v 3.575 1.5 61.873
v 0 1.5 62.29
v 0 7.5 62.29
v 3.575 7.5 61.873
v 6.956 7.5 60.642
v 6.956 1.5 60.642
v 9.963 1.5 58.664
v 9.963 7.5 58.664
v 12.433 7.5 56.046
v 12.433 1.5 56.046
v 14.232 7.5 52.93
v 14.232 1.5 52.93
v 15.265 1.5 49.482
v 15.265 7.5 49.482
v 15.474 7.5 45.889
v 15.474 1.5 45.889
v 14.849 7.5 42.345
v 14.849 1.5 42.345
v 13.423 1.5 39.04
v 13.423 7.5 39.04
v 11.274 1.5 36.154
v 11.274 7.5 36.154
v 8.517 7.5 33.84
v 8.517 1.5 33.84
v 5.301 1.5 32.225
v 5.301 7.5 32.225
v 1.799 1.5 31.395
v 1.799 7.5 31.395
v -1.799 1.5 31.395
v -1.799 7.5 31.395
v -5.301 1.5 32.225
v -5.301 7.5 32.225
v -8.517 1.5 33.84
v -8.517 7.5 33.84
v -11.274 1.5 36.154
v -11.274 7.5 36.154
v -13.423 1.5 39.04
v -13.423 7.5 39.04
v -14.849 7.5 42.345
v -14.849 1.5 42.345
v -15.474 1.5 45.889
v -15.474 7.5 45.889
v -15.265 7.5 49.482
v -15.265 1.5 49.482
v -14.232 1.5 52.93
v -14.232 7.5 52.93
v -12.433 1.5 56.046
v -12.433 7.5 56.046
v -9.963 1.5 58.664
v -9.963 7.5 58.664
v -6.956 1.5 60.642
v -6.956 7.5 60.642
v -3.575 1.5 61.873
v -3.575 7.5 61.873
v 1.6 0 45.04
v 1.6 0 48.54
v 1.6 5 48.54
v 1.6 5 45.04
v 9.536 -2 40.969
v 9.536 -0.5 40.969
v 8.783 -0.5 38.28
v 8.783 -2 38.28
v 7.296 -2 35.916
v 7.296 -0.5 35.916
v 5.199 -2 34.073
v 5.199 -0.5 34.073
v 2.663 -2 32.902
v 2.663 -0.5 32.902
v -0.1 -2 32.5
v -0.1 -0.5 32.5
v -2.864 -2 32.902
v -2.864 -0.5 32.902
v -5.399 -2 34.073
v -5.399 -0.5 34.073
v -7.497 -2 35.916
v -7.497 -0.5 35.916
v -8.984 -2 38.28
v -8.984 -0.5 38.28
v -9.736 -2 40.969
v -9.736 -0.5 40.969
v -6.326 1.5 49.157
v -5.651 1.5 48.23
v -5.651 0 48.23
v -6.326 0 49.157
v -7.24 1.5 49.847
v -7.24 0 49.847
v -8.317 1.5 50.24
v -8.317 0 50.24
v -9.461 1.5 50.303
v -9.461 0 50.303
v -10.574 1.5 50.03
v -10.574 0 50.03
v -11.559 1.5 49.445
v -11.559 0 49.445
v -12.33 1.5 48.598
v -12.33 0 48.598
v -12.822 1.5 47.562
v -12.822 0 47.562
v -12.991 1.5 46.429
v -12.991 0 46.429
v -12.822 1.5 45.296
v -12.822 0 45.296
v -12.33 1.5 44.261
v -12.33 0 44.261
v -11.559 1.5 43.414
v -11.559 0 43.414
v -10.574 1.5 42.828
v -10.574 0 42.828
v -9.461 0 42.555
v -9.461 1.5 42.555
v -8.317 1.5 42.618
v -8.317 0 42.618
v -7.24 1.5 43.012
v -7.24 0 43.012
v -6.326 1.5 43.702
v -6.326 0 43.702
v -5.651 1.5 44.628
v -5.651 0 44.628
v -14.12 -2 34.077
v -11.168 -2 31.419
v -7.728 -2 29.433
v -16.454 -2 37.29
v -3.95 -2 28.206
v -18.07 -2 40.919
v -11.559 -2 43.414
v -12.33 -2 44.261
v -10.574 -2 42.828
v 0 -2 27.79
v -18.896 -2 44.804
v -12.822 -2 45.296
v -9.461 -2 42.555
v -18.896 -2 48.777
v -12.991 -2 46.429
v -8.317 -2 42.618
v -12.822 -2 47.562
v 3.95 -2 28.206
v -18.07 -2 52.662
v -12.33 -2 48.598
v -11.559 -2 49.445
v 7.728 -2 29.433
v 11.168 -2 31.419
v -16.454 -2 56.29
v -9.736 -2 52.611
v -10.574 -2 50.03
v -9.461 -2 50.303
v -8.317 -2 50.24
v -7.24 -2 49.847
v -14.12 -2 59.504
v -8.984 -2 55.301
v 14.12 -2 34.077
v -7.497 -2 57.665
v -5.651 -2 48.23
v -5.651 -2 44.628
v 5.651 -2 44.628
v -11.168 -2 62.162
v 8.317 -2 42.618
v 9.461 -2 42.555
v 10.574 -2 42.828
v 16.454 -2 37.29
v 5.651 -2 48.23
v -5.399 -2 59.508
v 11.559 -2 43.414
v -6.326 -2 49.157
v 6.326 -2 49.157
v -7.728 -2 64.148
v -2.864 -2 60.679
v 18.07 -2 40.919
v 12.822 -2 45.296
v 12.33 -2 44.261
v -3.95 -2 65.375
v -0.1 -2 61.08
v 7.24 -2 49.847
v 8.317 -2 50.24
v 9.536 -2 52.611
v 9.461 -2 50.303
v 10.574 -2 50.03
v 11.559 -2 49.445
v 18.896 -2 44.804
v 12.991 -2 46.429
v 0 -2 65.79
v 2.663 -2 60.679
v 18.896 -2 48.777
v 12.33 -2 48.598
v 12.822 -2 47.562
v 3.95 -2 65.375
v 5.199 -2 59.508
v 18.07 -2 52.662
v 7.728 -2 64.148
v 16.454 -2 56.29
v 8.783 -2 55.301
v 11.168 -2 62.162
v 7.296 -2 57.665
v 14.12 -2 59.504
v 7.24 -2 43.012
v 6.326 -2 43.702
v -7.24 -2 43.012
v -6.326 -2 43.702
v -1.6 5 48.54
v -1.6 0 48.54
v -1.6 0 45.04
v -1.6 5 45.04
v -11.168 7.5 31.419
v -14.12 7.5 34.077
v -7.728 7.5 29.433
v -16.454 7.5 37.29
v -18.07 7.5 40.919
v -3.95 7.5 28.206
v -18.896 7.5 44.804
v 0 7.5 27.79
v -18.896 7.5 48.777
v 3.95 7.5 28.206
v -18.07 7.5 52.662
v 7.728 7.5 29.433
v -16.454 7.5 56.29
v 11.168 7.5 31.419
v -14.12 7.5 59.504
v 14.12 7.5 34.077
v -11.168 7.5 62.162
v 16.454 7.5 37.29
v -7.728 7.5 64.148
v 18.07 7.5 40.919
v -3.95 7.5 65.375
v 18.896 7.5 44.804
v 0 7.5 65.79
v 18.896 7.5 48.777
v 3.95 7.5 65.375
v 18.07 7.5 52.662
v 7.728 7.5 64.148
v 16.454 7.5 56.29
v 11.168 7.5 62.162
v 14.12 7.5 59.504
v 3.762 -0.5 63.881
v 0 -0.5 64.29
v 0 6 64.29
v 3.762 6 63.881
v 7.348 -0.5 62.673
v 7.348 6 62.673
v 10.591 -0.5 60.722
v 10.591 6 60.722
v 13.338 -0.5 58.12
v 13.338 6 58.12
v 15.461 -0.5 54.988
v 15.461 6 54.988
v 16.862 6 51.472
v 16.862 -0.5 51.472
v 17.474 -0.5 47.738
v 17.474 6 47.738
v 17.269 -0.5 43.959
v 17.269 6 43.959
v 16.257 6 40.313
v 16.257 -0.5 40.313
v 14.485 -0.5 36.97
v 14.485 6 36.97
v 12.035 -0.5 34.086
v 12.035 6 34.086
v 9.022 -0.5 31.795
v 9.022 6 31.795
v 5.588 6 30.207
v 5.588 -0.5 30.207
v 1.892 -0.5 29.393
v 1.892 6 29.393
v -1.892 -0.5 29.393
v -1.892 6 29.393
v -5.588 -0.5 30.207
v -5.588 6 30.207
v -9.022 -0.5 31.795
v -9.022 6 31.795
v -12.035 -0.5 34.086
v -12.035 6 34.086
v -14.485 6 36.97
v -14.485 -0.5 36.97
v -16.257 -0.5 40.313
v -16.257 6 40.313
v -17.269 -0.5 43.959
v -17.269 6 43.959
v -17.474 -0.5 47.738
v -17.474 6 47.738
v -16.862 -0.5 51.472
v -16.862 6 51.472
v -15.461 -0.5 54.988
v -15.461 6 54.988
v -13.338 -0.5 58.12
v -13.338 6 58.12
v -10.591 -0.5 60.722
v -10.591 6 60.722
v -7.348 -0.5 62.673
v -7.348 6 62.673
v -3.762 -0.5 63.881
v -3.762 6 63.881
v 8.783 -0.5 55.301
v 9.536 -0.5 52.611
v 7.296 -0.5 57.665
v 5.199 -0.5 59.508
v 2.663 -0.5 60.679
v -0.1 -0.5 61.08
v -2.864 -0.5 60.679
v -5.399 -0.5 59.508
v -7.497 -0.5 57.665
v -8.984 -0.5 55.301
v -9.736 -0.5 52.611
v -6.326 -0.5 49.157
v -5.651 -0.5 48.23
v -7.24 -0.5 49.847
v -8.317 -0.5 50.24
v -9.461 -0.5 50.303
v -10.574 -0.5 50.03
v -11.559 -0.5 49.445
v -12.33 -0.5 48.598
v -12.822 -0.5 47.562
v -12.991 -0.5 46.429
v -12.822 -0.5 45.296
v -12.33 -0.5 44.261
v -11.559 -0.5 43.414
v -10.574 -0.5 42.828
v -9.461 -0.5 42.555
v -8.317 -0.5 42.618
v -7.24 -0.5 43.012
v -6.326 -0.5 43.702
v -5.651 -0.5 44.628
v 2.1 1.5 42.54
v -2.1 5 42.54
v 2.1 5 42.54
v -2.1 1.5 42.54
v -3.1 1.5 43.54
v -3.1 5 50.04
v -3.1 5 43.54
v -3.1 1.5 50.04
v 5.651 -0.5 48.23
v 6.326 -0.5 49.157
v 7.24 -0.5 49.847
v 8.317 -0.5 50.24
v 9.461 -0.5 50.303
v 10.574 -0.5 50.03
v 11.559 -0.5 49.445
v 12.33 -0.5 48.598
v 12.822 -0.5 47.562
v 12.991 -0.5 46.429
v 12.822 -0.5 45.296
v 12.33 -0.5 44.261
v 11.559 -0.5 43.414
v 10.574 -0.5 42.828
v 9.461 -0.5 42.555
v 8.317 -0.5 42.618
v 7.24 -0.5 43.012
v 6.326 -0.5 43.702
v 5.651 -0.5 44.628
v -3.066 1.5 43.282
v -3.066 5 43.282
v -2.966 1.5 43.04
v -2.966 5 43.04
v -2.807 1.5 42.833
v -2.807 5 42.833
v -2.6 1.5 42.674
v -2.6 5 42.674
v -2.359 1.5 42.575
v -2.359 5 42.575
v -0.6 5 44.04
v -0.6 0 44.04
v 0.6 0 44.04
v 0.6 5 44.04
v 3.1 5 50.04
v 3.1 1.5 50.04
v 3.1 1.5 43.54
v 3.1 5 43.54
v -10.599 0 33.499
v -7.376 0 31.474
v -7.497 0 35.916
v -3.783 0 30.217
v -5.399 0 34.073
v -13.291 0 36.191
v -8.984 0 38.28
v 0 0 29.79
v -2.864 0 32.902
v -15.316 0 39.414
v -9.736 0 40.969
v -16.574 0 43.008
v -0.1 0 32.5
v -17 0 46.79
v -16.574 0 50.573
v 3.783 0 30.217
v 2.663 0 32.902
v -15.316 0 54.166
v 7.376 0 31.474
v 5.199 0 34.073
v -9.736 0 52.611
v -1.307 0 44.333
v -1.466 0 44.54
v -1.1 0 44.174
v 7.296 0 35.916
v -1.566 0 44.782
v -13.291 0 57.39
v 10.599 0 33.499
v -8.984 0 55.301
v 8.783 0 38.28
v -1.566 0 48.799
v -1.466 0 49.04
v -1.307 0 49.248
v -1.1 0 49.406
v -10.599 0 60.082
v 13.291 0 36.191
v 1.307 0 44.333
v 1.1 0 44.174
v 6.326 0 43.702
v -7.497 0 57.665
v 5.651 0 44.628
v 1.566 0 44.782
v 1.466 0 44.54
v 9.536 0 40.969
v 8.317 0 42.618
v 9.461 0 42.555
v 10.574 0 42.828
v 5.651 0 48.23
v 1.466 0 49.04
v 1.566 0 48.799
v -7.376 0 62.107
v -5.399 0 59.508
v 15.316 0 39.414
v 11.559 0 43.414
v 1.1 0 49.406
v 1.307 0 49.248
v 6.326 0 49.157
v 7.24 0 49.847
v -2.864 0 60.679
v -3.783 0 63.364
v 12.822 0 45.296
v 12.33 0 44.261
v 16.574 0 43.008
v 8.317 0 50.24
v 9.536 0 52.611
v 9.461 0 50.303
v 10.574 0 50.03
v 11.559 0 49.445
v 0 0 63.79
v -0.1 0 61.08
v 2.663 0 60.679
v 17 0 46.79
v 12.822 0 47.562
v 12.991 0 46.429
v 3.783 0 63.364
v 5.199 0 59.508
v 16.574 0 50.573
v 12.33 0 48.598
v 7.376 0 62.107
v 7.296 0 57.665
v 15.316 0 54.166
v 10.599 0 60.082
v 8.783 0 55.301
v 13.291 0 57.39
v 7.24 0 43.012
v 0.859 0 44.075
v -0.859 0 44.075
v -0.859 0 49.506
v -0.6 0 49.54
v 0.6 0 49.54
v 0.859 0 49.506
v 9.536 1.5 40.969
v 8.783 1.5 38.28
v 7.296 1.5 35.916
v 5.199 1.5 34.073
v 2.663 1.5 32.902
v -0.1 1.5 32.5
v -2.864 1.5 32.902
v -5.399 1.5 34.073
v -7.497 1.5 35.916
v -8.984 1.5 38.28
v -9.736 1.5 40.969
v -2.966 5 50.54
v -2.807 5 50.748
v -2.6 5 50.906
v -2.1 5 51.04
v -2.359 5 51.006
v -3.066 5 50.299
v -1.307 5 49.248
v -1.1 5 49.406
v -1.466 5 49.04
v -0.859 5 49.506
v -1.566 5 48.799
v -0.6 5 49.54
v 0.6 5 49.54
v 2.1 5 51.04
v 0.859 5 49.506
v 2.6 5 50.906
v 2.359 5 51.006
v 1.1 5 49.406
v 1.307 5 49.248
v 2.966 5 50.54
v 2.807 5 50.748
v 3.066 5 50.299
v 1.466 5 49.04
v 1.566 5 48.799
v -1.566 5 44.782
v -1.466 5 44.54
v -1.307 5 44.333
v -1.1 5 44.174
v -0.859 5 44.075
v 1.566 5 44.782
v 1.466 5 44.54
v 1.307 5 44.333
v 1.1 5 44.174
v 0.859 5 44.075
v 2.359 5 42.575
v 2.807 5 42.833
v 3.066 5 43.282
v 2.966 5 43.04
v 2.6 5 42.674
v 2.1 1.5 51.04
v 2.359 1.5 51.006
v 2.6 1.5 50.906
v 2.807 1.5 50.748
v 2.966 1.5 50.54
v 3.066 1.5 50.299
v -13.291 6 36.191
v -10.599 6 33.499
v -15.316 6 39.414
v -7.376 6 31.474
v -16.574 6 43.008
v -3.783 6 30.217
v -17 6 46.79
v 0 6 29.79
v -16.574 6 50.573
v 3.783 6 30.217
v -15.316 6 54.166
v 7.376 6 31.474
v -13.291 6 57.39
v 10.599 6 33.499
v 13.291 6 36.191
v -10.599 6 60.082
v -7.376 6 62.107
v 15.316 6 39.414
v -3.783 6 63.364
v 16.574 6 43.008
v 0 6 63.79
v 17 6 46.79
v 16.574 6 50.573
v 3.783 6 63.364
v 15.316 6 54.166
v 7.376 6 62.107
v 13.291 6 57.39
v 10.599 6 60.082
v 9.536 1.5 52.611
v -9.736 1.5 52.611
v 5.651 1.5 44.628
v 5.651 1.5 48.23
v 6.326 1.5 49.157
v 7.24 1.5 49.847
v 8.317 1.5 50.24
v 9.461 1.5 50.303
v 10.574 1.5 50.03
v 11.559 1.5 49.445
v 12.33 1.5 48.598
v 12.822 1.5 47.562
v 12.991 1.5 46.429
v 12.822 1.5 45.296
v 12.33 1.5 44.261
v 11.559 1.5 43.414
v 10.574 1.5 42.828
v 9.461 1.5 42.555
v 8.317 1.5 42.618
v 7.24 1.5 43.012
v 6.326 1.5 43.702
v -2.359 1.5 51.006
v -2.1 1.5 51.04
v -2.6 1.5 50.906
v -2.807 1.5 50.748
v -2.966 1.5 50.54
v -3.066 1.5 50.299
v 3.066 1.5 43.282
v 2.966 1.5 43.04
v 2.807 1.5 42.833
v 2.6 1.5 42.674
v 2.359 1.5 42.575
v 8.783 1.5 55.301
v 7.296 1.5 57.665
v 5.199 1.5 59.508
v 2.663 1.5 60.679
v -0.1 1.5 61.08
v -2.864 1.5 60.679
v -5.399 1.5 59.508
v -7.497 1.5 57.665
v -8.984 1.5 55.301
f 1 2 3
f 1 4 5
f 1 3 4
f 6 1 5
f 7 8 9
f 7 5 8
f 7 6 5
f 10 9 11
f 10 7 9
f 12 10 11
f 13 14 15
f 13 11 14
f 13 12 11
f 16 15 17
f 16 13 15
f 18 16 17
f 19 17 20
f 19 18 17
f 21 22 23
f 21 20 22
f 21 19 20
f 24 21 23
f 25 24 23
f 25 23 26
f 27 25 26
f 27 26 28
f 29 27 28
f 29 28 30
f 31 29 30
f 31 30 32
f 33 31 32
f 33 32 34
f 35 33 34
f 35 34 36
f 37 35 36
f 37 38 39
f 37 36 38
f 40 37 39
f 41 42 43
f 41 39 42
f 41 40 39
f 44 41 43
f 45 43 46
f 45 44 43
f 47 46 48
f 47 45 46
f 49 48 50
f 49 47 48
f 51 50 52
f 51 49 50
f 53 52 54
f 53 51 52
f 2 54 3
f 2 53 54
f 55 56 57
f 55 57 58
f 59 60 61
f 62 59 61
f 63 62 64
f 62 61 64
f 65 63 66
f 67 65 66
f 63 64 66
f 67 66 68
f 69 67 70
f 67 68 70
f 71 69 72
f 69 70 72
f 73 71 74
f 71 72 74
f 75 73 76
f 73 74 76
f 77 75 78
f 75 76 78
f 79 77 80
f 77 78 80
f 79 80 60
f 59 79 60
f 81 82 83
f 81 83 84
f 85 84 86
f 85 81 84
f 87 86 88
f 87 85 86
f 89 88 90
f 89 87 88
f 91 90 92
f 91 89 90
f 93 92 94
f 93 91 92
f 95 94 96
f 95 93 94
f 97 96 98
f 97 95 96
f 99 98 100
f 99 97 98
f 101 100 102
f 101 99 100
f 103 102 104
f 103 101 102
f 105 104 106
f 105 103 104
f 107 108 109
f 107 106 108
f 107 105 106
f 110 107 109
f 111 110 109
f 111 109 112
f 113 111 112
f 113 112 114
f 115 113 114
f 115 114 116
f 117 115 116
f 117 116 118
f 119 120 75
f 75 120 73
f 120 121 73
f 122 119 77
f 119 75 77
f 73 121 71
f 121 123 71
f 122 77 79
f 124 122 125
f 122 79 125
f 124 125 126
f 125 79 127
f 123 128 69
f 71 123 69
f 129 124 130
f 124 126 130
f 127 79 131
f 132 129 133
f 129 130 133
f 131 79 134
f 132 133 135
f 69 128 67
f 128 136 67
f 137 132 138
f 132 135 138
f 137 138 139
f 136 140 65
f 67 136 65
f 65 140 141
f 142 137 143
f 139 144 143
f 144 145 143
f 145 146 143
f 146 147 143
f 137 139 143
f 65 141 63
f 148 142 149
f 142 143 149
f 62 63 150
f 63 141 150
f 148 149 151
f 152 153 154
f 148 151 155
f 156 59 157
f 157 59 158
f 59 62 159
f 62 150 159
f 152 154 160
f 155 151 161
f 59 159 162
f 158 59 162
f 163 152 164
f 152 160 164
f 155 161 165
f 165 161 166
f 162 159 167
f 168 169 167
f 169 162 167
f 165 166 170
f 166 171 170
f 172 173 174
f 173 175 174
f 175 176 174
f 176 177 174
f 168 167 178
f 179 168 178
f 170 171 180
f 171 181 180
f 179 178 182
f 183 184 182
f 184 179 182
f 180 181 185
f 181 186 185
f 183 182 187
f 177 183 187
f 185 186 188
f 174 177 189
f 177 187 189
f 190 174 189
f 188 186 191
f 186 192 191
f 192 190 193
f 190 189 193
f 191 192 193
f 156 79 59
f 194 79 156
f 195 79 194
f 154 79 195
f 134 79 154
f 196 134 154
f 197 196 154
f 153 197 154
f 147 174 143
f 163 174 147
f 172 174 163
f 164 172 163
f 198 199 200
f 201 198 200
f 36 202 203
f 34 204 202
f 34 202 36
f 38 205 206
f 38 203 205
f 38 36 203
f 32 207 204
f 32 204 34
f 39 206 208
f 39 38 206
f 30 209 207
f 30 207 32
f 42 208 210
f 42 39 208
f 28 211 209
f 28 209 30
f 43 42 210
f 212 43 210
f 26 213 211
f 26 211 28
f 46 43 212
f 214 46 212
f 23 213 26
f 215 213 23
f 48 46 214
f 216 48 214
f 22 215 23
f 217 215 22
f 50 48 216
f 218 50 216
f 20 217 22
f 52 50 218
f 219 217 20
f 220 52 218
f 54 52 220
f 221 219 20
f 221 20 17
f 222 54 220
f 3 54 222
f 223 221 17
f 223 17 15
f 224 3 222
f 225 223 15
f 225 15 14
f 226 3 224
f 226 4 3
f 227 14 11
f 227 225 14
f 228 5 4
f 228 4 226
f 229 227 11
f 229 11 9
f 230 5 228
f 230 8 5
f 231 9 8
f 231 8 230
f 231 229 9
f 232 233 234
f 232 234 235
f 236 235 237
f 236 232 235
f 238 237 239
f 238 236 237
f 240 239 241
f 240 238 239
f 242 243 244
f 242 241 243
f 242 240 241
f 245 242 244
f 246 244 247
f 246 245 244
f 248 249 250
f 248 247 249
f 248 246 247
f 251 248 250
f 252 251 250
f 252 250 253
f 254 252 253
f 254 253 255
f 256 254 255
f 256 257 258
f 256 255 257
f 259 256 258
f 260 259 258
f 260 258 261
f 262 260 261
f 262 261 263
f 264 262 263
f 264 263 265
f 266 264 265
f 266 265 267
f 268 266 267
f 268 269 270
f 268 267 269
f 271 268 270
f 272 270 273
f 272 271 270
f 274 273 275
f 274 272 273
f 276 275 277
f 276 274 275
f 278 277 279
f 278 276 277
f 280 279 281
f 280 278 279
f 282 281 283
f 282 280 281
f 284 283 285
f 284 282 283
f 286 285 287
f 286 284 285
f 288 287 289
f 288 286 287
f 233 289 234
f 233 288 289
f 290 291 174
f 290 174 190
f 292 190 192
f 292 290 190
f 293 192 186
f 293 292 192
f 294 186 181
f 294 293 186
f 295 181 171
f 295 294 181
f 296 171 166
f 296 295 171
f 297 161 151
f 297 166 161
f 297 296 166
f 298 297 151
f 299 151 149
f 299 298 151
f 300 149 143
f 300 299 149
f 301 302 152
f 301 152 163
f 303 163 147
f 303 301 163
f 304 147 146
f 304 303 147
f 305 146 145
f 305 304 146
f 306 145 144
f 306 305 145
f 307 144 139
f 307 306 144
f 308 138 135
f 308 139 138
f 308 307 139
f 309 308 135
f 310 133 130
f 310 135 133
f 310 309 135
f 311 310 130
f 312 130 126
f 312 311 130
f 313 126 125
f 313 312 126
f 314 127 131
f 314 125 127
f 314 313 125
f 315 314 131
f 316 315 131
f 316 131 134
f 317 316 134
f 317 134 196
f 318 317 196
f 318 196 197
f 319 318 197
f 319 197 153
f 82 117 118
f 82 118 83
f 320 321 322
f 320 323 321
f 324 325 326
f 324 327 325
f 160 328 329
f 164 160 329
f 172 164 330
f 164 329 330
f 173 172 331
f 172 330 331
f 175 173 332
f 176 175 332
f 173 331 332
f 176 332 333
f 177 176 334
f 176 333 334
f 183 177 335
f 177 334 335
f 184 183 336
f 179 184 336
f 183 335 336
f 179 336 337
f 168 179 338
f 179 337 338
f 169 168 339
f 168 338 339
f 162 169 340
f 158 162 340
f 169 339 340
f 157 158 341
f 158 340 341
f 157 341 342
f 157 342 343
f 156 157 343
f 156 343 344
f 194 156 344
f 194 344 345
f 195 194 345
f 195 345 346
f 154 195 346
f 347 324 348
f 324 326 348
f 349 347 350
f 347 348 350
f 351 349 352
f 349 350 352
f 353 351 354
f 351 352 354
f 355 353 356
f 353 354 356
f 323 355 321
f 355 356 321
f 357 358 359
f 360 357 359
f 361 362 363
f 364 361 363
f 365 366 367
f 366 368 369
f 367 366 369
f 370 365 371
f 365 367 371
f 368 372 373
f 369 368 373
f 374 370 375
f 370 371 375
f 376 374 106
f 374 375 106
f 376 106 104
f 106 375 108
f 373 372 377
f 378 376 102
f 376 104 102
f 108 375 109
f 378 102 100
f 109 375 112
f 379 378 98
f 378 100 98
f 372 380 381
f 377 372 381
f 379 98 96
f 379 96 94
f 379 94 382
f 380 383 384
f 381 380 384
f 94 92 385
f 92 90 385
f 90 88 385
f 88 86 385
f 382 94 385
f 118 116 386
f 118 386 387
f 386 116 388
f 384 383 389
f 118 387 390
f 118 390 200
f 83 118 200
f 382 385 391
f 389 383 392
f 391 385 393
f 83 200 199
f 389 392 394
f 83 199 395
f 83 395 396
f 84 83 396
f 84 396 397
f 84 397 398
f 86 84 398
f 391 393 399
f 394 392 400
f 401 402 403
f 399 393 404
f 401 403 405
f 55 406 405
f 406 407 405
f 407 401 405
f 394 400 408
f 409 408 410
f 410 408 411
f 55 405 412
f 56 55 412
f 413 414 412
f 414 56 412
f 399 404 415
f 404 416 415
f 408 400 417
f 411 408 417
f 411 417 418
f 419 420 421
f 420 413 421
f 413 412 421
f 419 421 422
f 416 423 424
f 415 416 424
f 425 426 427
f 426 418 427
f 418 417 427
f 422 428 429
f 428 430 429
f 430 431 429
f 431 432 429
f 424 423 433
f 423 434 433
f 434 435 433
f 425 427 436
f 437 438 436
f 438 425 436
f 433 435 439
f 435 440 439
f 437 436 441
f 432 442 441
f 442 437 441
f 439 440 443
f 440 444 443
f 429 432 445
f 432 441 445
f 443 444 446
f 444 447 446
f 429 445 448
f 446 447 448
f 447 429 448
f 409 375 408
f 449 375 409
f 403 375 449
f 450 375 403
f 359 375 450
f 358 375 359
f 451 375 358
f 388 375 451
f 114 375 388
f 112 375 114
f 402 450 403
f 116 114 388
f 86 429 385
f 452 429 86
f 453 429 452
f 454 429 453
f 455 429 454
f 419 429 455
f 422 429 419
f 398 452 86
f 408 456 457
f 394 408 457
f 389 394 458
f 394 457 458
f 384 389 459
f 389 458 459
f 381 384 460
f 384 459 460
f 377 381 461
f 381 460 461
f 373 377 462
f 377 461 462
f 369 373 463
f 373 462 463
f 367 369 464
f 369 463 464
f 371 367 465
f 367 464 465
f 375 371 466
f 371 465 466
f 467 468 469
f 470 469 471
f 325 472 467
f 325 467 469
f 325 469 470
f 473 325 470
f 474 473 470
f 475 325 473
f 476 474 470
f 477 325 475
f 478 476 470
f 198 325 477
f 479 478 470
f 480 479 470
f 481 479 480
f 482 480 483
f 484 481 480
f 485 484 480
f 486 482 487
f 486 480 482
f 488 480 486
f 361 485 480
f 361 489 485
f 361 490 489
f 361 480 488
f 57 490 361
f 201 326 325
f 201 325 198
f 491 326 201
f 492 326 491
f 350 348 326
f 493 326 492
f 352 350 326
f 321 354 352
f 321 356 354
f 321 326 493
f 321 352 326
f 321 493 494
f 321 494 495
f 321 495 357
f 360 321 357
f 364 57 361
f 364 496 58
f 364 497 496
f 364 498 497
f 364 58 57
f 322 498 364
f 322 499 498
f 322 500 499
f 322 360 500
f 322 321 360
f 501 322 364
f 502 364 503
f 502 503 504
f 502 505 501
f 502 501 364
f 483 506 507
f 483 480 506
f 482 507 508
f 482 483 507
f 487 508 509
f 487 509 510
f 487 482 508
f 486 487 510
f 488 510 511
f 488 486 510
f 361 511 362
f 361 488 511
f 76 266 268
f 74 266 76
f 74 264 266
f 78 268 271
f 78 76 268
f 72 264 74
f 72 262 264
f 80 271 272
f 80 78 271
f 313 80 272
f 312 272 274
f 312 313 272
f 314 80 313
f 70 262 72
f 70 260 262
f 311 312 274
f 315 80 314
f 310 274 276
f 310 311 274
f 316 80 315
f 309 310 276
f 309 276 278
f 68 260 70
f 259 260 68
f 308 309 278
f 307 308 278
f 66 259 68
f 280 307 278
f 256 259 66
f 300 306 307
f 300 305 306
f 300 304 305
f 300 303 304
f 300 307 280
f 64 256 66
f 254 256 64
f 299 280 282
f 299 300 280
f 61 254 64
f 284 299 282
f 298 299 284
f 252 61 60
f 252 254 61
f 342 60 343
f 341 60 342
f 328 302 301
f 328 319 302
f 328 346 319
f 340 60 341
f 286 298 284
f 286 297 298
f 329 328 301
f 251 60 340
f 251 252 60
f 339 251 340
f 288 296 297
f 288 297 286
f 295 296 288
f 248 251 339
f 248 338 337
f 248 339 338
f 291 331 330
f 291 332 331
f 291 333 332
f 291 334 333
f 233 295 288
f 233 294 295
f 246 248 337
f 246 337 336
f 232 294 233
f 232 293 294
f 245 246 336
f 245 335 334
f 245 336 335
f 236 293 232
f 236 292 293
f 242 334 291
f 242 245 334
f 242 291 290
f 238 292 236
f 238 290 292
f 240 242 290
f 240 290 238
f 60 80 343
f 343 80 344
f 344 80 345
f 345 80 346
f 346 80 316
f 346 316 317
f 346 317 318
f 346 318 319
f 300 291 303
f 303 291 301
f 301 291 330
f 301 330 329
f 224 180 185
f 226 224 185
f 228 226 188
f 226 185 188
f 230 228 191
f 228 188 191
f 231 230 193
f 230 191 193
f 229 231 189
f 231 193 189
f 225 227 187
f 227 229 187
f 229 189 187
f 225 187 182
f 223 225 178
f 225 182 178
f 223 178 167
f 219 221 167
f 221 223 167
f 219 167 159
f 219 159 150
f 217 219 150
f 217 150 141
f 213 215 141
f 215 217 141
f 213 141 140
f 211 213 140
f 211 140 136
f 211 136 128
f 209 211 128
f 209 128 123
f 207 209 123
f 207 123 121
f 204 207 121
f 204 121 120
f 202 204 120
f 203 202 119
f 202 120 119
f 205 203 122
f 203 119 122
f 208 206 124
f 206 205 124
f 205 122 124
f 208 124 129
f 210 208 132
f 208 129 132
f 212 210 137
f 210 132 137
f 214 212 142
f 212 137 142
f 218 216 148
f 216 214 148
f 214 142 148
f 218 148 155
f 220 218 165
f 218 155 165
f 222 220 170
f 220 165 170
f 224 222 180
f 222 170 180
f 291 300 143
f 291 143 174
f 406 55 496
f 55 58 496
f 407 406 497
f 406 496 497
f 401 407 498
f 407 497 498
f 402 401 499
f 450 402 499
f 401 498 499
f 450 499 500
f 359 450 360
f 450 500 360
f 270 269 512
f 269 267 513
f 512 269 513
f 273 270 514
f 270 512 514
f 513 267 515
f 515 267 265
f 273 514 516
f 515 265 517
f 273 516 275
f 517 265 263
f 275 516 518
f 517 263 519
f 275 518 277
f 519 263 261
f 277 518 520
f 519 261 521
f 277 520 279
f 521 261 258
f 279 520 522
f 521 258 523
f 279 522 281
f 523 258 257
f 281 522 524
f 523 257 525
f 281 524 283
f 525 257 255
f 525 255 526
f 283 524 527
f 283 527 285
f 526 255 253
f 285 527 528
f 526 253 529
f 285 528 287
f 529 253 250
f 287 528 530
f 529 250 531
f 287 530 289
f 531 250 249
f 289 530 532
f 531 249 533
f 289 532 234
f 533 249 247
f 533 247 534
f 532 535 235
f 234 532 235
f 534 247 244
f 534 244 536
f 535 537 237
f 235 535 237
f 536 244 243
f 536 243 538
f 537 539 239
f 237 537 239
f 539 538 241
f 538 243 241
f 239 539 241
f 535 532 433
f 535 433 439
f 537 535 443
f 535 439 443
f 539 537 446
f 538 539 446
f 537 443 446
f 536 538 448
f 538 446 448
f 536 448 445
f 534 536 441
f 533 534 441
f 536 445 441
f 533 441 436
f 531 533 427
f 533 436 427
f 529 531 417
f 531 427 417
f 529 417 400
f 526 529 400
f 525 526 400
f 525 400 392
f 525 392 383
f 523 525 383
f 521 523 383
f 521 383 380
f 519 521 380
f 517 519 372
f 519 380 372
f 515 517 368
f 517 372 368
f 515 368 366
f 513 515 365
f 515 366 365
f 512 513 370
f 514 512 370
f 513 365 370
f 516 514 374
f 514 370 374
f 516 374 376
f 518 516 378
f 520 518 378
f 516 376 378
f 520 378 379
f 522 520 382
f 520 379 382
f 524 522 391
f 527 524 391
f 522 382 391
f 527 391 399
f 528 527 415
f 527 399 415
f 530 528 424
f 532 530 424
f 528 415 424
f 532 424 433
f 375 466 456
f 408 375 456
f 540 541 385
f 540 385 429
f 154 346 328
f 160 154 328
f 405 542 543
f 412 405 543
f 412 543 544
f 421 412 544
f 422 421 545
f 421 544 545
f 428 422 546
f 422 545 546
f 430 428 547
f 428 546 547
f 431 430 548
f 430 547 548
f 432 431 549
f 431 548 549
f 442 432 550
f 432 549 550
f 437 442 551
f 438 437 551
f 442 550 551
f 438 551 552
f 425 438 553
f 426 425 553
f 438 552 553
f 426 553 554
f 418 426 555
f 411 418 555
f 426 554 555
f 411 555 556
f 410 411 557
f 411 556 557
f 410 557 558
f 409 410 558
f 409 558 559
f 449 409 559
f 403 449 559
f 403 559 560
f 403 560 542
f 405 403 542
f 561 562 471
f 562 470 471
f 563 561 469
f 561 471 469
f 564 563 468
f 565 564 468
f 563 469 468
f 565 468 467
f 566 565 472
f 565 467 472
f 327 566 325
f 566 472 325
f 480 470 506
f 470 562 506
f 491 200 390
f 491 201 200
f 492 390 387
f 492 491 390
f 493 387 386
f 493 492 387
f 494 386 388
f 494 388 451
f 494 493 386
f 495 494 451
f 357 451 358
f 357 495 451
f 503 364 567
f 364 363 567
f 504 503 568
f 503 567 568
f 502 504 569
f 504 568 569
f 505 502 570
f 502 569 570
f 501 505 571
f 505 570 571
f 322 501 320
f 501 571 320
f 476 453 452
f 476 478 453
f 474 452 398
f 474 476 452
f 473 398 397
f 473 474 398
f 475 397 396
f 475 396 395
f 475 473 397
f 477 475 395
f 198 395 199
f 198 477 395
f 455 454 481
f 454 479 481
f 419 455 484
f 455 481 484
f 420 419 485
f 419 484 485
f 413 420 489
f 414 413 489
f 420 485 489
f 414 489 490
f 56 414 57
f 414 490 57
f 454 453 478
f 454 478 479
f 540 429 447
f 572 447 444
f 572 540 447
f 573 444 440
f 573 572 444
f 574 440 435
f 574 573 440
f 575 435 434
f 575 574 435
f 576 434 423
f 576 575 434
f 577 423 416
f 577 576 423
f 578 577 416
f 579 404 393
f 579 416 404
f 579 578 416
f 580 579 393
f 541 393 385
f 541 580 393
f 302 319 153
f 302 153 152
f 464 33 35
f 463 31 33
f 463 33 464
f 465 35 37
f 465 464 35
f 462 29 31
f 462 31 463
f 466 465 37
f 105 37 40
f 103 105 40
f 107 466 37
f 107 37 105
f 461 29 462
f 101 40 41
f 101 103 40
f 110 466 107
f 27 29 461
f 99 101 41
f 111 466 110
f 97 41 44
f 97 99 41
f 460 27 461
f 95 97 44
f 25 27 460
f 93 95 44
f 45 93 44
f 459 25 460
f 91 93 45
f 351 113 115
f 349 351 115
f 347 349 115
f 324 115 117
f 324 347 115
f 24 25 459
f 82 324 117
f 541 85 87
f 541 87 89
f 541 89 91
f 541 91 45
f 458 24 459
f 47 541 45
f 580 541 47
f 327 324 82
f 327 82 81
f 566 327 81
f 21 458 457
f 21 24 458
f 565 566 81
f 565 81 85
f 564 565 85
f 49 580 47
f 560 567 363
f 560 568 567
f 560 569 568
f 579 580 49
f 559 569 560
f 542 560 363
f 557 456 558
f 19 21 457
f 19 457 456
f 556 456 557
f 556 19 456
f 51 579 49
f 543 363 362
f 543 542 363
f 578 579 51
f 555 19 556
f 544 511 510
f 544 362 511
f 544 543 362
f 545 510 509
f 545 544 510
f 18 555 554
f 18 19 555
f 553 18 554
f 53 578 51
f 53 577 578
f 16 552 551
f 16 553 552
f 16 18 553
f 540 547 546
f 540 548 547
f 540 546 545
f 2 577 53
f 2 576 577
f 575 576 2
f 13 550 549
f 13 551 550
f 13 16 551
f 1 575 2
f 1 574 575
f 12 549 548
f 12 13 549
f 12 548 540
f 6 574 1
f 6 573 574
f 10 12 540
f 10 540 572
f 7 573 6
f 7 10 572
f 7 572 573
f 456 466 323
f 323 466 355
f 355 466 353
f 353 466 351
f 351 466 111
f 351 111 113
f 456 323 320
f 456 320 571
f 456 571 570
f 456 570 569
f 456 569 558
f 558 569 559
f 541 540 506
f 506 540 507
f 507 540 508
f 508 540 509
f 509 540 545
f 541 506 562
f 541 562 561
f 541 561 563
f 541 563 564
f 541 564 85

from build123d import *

# Parameters (mm, degrees)
SKETCH4_R           = 17
BOSS_EXTRUDE3_DEPTH = 6
SHELL4_T            = 0.5
SKETCH5_W           = 3.2
SKETCH5_H           = 5.5
BOSS_EXTRUDE4_DEPTH = 5
SHELL5_T            = 1.5
CUT_EXTRUDE2_DEPTH  = 69.741433184
FILLET1_R           = 1


with BuildPart() as part:
    # Sketch4 → Boss-Extrude3 (new body)
    with BuildSketch(Plane(origin=(0, 0, 0), x_dir=(1, 0, 0), z_dir=(0, 1, 0))):
        with Locations(Location((0, -46.79046007, 0), (0, 0, 270))):
            Circle(SKETCH4_R)
    extrude(amount=BOSS_EXTRUDE3_DEPTH)

    # Shell4
    shell4_openings = [part.faces().sort_by_distance(p)[0] for p in [
        (0, 6, 46.79046007),
    ]]
    offset(amount=SHELL4_T, openings=shell4_openings, kind=Kind.INTERSECTION)

    # Sketch5 → Boss-Extrude4 (add)
    with BuildSketch(Plane(origin=(0, 0, 0), x_dir=(1, 0, 0), z_dir=(0, 1, 0))):
        with Locations((0, -46.79046007)):
            Rectangle(SKETCH5_W, SKETCH5_H)
    extrude(amount=BOSS_EXTRUDE4_DEPTH)

    # Shell5
    shell5_openings = [part.faces().sort_by_distance(p)[0] for p in [
        (0, 5, 46.79046007),
    ]]
    offset(amount=SHELL5_T, openings=shell5_openings, kind=Kind.INTERSECTION)

    # Sketch8 → Cut-Extrude2 (cut, through all)
    with BuildSketch(Plane(origin=(0, 1.5, 0), x_dir=(1, 0, 0), z_dir=(0, 1, 0))):
        with BuildLine():
            Line((-9.736425903, -40.96944233), (9.535773011, -40.96944233))
            ThreePointArc((9.535773011, -40.96944233), (-0.100326446, -32.500466178), (-9.736425903, -40.96944233))
        make_face()
        with BuildLine():
            Line((-9.736425903, -52.61147781), (9.535773011, -52.61147781))
            ThreePointArc((9.535773011, -52.61147781), (-0.100326446, -61.080453963), (-9.736425903, -52.61147781))
        make_face()
        with BuildLine():
            Line((-5.651322976, -44.628261801), (-5.651322976, -48.229929487))
            ThreePointArc((-5.651322976, -48.229929487), (-12.990843168, -46.429095644), (-5.651322976, -44.628261801))
        make_face()
        with BuildLine():
            Line((5.651322976, -44.628261801), (5.651322976, -48.229929487))
            ThreePointArc((5.651322976, -48.229929487), (12.990843168, -46.429095644), (5.651322976, -44.628261801))
        make_face()
    extrude(amount=-CUT_EXTRUDE2_DEPTH, mode=Mode.SUBTRACT)

    # Fillet1
    fillet1_edges = [part.edges().sort_by_distance(p)[0] for p in [
        (3.1, 3.25, 51.04046007),
        (3.1, 3.25, 42.54046007),
        (-3.1, 3.25, 42.54046007),
        (-3.1, 3.25, 51.04046007),
        (1.6, 2.5, 49.54046007),
        (1.6, 2.5, 44.04046007),
        (-1.6, 2.5, 44.04046007),
        (-1.6, 2.5, 49.54046007),
    ]]
    fillet(fillet1_edges, radius=FILLET1_R)


solid = part.part
